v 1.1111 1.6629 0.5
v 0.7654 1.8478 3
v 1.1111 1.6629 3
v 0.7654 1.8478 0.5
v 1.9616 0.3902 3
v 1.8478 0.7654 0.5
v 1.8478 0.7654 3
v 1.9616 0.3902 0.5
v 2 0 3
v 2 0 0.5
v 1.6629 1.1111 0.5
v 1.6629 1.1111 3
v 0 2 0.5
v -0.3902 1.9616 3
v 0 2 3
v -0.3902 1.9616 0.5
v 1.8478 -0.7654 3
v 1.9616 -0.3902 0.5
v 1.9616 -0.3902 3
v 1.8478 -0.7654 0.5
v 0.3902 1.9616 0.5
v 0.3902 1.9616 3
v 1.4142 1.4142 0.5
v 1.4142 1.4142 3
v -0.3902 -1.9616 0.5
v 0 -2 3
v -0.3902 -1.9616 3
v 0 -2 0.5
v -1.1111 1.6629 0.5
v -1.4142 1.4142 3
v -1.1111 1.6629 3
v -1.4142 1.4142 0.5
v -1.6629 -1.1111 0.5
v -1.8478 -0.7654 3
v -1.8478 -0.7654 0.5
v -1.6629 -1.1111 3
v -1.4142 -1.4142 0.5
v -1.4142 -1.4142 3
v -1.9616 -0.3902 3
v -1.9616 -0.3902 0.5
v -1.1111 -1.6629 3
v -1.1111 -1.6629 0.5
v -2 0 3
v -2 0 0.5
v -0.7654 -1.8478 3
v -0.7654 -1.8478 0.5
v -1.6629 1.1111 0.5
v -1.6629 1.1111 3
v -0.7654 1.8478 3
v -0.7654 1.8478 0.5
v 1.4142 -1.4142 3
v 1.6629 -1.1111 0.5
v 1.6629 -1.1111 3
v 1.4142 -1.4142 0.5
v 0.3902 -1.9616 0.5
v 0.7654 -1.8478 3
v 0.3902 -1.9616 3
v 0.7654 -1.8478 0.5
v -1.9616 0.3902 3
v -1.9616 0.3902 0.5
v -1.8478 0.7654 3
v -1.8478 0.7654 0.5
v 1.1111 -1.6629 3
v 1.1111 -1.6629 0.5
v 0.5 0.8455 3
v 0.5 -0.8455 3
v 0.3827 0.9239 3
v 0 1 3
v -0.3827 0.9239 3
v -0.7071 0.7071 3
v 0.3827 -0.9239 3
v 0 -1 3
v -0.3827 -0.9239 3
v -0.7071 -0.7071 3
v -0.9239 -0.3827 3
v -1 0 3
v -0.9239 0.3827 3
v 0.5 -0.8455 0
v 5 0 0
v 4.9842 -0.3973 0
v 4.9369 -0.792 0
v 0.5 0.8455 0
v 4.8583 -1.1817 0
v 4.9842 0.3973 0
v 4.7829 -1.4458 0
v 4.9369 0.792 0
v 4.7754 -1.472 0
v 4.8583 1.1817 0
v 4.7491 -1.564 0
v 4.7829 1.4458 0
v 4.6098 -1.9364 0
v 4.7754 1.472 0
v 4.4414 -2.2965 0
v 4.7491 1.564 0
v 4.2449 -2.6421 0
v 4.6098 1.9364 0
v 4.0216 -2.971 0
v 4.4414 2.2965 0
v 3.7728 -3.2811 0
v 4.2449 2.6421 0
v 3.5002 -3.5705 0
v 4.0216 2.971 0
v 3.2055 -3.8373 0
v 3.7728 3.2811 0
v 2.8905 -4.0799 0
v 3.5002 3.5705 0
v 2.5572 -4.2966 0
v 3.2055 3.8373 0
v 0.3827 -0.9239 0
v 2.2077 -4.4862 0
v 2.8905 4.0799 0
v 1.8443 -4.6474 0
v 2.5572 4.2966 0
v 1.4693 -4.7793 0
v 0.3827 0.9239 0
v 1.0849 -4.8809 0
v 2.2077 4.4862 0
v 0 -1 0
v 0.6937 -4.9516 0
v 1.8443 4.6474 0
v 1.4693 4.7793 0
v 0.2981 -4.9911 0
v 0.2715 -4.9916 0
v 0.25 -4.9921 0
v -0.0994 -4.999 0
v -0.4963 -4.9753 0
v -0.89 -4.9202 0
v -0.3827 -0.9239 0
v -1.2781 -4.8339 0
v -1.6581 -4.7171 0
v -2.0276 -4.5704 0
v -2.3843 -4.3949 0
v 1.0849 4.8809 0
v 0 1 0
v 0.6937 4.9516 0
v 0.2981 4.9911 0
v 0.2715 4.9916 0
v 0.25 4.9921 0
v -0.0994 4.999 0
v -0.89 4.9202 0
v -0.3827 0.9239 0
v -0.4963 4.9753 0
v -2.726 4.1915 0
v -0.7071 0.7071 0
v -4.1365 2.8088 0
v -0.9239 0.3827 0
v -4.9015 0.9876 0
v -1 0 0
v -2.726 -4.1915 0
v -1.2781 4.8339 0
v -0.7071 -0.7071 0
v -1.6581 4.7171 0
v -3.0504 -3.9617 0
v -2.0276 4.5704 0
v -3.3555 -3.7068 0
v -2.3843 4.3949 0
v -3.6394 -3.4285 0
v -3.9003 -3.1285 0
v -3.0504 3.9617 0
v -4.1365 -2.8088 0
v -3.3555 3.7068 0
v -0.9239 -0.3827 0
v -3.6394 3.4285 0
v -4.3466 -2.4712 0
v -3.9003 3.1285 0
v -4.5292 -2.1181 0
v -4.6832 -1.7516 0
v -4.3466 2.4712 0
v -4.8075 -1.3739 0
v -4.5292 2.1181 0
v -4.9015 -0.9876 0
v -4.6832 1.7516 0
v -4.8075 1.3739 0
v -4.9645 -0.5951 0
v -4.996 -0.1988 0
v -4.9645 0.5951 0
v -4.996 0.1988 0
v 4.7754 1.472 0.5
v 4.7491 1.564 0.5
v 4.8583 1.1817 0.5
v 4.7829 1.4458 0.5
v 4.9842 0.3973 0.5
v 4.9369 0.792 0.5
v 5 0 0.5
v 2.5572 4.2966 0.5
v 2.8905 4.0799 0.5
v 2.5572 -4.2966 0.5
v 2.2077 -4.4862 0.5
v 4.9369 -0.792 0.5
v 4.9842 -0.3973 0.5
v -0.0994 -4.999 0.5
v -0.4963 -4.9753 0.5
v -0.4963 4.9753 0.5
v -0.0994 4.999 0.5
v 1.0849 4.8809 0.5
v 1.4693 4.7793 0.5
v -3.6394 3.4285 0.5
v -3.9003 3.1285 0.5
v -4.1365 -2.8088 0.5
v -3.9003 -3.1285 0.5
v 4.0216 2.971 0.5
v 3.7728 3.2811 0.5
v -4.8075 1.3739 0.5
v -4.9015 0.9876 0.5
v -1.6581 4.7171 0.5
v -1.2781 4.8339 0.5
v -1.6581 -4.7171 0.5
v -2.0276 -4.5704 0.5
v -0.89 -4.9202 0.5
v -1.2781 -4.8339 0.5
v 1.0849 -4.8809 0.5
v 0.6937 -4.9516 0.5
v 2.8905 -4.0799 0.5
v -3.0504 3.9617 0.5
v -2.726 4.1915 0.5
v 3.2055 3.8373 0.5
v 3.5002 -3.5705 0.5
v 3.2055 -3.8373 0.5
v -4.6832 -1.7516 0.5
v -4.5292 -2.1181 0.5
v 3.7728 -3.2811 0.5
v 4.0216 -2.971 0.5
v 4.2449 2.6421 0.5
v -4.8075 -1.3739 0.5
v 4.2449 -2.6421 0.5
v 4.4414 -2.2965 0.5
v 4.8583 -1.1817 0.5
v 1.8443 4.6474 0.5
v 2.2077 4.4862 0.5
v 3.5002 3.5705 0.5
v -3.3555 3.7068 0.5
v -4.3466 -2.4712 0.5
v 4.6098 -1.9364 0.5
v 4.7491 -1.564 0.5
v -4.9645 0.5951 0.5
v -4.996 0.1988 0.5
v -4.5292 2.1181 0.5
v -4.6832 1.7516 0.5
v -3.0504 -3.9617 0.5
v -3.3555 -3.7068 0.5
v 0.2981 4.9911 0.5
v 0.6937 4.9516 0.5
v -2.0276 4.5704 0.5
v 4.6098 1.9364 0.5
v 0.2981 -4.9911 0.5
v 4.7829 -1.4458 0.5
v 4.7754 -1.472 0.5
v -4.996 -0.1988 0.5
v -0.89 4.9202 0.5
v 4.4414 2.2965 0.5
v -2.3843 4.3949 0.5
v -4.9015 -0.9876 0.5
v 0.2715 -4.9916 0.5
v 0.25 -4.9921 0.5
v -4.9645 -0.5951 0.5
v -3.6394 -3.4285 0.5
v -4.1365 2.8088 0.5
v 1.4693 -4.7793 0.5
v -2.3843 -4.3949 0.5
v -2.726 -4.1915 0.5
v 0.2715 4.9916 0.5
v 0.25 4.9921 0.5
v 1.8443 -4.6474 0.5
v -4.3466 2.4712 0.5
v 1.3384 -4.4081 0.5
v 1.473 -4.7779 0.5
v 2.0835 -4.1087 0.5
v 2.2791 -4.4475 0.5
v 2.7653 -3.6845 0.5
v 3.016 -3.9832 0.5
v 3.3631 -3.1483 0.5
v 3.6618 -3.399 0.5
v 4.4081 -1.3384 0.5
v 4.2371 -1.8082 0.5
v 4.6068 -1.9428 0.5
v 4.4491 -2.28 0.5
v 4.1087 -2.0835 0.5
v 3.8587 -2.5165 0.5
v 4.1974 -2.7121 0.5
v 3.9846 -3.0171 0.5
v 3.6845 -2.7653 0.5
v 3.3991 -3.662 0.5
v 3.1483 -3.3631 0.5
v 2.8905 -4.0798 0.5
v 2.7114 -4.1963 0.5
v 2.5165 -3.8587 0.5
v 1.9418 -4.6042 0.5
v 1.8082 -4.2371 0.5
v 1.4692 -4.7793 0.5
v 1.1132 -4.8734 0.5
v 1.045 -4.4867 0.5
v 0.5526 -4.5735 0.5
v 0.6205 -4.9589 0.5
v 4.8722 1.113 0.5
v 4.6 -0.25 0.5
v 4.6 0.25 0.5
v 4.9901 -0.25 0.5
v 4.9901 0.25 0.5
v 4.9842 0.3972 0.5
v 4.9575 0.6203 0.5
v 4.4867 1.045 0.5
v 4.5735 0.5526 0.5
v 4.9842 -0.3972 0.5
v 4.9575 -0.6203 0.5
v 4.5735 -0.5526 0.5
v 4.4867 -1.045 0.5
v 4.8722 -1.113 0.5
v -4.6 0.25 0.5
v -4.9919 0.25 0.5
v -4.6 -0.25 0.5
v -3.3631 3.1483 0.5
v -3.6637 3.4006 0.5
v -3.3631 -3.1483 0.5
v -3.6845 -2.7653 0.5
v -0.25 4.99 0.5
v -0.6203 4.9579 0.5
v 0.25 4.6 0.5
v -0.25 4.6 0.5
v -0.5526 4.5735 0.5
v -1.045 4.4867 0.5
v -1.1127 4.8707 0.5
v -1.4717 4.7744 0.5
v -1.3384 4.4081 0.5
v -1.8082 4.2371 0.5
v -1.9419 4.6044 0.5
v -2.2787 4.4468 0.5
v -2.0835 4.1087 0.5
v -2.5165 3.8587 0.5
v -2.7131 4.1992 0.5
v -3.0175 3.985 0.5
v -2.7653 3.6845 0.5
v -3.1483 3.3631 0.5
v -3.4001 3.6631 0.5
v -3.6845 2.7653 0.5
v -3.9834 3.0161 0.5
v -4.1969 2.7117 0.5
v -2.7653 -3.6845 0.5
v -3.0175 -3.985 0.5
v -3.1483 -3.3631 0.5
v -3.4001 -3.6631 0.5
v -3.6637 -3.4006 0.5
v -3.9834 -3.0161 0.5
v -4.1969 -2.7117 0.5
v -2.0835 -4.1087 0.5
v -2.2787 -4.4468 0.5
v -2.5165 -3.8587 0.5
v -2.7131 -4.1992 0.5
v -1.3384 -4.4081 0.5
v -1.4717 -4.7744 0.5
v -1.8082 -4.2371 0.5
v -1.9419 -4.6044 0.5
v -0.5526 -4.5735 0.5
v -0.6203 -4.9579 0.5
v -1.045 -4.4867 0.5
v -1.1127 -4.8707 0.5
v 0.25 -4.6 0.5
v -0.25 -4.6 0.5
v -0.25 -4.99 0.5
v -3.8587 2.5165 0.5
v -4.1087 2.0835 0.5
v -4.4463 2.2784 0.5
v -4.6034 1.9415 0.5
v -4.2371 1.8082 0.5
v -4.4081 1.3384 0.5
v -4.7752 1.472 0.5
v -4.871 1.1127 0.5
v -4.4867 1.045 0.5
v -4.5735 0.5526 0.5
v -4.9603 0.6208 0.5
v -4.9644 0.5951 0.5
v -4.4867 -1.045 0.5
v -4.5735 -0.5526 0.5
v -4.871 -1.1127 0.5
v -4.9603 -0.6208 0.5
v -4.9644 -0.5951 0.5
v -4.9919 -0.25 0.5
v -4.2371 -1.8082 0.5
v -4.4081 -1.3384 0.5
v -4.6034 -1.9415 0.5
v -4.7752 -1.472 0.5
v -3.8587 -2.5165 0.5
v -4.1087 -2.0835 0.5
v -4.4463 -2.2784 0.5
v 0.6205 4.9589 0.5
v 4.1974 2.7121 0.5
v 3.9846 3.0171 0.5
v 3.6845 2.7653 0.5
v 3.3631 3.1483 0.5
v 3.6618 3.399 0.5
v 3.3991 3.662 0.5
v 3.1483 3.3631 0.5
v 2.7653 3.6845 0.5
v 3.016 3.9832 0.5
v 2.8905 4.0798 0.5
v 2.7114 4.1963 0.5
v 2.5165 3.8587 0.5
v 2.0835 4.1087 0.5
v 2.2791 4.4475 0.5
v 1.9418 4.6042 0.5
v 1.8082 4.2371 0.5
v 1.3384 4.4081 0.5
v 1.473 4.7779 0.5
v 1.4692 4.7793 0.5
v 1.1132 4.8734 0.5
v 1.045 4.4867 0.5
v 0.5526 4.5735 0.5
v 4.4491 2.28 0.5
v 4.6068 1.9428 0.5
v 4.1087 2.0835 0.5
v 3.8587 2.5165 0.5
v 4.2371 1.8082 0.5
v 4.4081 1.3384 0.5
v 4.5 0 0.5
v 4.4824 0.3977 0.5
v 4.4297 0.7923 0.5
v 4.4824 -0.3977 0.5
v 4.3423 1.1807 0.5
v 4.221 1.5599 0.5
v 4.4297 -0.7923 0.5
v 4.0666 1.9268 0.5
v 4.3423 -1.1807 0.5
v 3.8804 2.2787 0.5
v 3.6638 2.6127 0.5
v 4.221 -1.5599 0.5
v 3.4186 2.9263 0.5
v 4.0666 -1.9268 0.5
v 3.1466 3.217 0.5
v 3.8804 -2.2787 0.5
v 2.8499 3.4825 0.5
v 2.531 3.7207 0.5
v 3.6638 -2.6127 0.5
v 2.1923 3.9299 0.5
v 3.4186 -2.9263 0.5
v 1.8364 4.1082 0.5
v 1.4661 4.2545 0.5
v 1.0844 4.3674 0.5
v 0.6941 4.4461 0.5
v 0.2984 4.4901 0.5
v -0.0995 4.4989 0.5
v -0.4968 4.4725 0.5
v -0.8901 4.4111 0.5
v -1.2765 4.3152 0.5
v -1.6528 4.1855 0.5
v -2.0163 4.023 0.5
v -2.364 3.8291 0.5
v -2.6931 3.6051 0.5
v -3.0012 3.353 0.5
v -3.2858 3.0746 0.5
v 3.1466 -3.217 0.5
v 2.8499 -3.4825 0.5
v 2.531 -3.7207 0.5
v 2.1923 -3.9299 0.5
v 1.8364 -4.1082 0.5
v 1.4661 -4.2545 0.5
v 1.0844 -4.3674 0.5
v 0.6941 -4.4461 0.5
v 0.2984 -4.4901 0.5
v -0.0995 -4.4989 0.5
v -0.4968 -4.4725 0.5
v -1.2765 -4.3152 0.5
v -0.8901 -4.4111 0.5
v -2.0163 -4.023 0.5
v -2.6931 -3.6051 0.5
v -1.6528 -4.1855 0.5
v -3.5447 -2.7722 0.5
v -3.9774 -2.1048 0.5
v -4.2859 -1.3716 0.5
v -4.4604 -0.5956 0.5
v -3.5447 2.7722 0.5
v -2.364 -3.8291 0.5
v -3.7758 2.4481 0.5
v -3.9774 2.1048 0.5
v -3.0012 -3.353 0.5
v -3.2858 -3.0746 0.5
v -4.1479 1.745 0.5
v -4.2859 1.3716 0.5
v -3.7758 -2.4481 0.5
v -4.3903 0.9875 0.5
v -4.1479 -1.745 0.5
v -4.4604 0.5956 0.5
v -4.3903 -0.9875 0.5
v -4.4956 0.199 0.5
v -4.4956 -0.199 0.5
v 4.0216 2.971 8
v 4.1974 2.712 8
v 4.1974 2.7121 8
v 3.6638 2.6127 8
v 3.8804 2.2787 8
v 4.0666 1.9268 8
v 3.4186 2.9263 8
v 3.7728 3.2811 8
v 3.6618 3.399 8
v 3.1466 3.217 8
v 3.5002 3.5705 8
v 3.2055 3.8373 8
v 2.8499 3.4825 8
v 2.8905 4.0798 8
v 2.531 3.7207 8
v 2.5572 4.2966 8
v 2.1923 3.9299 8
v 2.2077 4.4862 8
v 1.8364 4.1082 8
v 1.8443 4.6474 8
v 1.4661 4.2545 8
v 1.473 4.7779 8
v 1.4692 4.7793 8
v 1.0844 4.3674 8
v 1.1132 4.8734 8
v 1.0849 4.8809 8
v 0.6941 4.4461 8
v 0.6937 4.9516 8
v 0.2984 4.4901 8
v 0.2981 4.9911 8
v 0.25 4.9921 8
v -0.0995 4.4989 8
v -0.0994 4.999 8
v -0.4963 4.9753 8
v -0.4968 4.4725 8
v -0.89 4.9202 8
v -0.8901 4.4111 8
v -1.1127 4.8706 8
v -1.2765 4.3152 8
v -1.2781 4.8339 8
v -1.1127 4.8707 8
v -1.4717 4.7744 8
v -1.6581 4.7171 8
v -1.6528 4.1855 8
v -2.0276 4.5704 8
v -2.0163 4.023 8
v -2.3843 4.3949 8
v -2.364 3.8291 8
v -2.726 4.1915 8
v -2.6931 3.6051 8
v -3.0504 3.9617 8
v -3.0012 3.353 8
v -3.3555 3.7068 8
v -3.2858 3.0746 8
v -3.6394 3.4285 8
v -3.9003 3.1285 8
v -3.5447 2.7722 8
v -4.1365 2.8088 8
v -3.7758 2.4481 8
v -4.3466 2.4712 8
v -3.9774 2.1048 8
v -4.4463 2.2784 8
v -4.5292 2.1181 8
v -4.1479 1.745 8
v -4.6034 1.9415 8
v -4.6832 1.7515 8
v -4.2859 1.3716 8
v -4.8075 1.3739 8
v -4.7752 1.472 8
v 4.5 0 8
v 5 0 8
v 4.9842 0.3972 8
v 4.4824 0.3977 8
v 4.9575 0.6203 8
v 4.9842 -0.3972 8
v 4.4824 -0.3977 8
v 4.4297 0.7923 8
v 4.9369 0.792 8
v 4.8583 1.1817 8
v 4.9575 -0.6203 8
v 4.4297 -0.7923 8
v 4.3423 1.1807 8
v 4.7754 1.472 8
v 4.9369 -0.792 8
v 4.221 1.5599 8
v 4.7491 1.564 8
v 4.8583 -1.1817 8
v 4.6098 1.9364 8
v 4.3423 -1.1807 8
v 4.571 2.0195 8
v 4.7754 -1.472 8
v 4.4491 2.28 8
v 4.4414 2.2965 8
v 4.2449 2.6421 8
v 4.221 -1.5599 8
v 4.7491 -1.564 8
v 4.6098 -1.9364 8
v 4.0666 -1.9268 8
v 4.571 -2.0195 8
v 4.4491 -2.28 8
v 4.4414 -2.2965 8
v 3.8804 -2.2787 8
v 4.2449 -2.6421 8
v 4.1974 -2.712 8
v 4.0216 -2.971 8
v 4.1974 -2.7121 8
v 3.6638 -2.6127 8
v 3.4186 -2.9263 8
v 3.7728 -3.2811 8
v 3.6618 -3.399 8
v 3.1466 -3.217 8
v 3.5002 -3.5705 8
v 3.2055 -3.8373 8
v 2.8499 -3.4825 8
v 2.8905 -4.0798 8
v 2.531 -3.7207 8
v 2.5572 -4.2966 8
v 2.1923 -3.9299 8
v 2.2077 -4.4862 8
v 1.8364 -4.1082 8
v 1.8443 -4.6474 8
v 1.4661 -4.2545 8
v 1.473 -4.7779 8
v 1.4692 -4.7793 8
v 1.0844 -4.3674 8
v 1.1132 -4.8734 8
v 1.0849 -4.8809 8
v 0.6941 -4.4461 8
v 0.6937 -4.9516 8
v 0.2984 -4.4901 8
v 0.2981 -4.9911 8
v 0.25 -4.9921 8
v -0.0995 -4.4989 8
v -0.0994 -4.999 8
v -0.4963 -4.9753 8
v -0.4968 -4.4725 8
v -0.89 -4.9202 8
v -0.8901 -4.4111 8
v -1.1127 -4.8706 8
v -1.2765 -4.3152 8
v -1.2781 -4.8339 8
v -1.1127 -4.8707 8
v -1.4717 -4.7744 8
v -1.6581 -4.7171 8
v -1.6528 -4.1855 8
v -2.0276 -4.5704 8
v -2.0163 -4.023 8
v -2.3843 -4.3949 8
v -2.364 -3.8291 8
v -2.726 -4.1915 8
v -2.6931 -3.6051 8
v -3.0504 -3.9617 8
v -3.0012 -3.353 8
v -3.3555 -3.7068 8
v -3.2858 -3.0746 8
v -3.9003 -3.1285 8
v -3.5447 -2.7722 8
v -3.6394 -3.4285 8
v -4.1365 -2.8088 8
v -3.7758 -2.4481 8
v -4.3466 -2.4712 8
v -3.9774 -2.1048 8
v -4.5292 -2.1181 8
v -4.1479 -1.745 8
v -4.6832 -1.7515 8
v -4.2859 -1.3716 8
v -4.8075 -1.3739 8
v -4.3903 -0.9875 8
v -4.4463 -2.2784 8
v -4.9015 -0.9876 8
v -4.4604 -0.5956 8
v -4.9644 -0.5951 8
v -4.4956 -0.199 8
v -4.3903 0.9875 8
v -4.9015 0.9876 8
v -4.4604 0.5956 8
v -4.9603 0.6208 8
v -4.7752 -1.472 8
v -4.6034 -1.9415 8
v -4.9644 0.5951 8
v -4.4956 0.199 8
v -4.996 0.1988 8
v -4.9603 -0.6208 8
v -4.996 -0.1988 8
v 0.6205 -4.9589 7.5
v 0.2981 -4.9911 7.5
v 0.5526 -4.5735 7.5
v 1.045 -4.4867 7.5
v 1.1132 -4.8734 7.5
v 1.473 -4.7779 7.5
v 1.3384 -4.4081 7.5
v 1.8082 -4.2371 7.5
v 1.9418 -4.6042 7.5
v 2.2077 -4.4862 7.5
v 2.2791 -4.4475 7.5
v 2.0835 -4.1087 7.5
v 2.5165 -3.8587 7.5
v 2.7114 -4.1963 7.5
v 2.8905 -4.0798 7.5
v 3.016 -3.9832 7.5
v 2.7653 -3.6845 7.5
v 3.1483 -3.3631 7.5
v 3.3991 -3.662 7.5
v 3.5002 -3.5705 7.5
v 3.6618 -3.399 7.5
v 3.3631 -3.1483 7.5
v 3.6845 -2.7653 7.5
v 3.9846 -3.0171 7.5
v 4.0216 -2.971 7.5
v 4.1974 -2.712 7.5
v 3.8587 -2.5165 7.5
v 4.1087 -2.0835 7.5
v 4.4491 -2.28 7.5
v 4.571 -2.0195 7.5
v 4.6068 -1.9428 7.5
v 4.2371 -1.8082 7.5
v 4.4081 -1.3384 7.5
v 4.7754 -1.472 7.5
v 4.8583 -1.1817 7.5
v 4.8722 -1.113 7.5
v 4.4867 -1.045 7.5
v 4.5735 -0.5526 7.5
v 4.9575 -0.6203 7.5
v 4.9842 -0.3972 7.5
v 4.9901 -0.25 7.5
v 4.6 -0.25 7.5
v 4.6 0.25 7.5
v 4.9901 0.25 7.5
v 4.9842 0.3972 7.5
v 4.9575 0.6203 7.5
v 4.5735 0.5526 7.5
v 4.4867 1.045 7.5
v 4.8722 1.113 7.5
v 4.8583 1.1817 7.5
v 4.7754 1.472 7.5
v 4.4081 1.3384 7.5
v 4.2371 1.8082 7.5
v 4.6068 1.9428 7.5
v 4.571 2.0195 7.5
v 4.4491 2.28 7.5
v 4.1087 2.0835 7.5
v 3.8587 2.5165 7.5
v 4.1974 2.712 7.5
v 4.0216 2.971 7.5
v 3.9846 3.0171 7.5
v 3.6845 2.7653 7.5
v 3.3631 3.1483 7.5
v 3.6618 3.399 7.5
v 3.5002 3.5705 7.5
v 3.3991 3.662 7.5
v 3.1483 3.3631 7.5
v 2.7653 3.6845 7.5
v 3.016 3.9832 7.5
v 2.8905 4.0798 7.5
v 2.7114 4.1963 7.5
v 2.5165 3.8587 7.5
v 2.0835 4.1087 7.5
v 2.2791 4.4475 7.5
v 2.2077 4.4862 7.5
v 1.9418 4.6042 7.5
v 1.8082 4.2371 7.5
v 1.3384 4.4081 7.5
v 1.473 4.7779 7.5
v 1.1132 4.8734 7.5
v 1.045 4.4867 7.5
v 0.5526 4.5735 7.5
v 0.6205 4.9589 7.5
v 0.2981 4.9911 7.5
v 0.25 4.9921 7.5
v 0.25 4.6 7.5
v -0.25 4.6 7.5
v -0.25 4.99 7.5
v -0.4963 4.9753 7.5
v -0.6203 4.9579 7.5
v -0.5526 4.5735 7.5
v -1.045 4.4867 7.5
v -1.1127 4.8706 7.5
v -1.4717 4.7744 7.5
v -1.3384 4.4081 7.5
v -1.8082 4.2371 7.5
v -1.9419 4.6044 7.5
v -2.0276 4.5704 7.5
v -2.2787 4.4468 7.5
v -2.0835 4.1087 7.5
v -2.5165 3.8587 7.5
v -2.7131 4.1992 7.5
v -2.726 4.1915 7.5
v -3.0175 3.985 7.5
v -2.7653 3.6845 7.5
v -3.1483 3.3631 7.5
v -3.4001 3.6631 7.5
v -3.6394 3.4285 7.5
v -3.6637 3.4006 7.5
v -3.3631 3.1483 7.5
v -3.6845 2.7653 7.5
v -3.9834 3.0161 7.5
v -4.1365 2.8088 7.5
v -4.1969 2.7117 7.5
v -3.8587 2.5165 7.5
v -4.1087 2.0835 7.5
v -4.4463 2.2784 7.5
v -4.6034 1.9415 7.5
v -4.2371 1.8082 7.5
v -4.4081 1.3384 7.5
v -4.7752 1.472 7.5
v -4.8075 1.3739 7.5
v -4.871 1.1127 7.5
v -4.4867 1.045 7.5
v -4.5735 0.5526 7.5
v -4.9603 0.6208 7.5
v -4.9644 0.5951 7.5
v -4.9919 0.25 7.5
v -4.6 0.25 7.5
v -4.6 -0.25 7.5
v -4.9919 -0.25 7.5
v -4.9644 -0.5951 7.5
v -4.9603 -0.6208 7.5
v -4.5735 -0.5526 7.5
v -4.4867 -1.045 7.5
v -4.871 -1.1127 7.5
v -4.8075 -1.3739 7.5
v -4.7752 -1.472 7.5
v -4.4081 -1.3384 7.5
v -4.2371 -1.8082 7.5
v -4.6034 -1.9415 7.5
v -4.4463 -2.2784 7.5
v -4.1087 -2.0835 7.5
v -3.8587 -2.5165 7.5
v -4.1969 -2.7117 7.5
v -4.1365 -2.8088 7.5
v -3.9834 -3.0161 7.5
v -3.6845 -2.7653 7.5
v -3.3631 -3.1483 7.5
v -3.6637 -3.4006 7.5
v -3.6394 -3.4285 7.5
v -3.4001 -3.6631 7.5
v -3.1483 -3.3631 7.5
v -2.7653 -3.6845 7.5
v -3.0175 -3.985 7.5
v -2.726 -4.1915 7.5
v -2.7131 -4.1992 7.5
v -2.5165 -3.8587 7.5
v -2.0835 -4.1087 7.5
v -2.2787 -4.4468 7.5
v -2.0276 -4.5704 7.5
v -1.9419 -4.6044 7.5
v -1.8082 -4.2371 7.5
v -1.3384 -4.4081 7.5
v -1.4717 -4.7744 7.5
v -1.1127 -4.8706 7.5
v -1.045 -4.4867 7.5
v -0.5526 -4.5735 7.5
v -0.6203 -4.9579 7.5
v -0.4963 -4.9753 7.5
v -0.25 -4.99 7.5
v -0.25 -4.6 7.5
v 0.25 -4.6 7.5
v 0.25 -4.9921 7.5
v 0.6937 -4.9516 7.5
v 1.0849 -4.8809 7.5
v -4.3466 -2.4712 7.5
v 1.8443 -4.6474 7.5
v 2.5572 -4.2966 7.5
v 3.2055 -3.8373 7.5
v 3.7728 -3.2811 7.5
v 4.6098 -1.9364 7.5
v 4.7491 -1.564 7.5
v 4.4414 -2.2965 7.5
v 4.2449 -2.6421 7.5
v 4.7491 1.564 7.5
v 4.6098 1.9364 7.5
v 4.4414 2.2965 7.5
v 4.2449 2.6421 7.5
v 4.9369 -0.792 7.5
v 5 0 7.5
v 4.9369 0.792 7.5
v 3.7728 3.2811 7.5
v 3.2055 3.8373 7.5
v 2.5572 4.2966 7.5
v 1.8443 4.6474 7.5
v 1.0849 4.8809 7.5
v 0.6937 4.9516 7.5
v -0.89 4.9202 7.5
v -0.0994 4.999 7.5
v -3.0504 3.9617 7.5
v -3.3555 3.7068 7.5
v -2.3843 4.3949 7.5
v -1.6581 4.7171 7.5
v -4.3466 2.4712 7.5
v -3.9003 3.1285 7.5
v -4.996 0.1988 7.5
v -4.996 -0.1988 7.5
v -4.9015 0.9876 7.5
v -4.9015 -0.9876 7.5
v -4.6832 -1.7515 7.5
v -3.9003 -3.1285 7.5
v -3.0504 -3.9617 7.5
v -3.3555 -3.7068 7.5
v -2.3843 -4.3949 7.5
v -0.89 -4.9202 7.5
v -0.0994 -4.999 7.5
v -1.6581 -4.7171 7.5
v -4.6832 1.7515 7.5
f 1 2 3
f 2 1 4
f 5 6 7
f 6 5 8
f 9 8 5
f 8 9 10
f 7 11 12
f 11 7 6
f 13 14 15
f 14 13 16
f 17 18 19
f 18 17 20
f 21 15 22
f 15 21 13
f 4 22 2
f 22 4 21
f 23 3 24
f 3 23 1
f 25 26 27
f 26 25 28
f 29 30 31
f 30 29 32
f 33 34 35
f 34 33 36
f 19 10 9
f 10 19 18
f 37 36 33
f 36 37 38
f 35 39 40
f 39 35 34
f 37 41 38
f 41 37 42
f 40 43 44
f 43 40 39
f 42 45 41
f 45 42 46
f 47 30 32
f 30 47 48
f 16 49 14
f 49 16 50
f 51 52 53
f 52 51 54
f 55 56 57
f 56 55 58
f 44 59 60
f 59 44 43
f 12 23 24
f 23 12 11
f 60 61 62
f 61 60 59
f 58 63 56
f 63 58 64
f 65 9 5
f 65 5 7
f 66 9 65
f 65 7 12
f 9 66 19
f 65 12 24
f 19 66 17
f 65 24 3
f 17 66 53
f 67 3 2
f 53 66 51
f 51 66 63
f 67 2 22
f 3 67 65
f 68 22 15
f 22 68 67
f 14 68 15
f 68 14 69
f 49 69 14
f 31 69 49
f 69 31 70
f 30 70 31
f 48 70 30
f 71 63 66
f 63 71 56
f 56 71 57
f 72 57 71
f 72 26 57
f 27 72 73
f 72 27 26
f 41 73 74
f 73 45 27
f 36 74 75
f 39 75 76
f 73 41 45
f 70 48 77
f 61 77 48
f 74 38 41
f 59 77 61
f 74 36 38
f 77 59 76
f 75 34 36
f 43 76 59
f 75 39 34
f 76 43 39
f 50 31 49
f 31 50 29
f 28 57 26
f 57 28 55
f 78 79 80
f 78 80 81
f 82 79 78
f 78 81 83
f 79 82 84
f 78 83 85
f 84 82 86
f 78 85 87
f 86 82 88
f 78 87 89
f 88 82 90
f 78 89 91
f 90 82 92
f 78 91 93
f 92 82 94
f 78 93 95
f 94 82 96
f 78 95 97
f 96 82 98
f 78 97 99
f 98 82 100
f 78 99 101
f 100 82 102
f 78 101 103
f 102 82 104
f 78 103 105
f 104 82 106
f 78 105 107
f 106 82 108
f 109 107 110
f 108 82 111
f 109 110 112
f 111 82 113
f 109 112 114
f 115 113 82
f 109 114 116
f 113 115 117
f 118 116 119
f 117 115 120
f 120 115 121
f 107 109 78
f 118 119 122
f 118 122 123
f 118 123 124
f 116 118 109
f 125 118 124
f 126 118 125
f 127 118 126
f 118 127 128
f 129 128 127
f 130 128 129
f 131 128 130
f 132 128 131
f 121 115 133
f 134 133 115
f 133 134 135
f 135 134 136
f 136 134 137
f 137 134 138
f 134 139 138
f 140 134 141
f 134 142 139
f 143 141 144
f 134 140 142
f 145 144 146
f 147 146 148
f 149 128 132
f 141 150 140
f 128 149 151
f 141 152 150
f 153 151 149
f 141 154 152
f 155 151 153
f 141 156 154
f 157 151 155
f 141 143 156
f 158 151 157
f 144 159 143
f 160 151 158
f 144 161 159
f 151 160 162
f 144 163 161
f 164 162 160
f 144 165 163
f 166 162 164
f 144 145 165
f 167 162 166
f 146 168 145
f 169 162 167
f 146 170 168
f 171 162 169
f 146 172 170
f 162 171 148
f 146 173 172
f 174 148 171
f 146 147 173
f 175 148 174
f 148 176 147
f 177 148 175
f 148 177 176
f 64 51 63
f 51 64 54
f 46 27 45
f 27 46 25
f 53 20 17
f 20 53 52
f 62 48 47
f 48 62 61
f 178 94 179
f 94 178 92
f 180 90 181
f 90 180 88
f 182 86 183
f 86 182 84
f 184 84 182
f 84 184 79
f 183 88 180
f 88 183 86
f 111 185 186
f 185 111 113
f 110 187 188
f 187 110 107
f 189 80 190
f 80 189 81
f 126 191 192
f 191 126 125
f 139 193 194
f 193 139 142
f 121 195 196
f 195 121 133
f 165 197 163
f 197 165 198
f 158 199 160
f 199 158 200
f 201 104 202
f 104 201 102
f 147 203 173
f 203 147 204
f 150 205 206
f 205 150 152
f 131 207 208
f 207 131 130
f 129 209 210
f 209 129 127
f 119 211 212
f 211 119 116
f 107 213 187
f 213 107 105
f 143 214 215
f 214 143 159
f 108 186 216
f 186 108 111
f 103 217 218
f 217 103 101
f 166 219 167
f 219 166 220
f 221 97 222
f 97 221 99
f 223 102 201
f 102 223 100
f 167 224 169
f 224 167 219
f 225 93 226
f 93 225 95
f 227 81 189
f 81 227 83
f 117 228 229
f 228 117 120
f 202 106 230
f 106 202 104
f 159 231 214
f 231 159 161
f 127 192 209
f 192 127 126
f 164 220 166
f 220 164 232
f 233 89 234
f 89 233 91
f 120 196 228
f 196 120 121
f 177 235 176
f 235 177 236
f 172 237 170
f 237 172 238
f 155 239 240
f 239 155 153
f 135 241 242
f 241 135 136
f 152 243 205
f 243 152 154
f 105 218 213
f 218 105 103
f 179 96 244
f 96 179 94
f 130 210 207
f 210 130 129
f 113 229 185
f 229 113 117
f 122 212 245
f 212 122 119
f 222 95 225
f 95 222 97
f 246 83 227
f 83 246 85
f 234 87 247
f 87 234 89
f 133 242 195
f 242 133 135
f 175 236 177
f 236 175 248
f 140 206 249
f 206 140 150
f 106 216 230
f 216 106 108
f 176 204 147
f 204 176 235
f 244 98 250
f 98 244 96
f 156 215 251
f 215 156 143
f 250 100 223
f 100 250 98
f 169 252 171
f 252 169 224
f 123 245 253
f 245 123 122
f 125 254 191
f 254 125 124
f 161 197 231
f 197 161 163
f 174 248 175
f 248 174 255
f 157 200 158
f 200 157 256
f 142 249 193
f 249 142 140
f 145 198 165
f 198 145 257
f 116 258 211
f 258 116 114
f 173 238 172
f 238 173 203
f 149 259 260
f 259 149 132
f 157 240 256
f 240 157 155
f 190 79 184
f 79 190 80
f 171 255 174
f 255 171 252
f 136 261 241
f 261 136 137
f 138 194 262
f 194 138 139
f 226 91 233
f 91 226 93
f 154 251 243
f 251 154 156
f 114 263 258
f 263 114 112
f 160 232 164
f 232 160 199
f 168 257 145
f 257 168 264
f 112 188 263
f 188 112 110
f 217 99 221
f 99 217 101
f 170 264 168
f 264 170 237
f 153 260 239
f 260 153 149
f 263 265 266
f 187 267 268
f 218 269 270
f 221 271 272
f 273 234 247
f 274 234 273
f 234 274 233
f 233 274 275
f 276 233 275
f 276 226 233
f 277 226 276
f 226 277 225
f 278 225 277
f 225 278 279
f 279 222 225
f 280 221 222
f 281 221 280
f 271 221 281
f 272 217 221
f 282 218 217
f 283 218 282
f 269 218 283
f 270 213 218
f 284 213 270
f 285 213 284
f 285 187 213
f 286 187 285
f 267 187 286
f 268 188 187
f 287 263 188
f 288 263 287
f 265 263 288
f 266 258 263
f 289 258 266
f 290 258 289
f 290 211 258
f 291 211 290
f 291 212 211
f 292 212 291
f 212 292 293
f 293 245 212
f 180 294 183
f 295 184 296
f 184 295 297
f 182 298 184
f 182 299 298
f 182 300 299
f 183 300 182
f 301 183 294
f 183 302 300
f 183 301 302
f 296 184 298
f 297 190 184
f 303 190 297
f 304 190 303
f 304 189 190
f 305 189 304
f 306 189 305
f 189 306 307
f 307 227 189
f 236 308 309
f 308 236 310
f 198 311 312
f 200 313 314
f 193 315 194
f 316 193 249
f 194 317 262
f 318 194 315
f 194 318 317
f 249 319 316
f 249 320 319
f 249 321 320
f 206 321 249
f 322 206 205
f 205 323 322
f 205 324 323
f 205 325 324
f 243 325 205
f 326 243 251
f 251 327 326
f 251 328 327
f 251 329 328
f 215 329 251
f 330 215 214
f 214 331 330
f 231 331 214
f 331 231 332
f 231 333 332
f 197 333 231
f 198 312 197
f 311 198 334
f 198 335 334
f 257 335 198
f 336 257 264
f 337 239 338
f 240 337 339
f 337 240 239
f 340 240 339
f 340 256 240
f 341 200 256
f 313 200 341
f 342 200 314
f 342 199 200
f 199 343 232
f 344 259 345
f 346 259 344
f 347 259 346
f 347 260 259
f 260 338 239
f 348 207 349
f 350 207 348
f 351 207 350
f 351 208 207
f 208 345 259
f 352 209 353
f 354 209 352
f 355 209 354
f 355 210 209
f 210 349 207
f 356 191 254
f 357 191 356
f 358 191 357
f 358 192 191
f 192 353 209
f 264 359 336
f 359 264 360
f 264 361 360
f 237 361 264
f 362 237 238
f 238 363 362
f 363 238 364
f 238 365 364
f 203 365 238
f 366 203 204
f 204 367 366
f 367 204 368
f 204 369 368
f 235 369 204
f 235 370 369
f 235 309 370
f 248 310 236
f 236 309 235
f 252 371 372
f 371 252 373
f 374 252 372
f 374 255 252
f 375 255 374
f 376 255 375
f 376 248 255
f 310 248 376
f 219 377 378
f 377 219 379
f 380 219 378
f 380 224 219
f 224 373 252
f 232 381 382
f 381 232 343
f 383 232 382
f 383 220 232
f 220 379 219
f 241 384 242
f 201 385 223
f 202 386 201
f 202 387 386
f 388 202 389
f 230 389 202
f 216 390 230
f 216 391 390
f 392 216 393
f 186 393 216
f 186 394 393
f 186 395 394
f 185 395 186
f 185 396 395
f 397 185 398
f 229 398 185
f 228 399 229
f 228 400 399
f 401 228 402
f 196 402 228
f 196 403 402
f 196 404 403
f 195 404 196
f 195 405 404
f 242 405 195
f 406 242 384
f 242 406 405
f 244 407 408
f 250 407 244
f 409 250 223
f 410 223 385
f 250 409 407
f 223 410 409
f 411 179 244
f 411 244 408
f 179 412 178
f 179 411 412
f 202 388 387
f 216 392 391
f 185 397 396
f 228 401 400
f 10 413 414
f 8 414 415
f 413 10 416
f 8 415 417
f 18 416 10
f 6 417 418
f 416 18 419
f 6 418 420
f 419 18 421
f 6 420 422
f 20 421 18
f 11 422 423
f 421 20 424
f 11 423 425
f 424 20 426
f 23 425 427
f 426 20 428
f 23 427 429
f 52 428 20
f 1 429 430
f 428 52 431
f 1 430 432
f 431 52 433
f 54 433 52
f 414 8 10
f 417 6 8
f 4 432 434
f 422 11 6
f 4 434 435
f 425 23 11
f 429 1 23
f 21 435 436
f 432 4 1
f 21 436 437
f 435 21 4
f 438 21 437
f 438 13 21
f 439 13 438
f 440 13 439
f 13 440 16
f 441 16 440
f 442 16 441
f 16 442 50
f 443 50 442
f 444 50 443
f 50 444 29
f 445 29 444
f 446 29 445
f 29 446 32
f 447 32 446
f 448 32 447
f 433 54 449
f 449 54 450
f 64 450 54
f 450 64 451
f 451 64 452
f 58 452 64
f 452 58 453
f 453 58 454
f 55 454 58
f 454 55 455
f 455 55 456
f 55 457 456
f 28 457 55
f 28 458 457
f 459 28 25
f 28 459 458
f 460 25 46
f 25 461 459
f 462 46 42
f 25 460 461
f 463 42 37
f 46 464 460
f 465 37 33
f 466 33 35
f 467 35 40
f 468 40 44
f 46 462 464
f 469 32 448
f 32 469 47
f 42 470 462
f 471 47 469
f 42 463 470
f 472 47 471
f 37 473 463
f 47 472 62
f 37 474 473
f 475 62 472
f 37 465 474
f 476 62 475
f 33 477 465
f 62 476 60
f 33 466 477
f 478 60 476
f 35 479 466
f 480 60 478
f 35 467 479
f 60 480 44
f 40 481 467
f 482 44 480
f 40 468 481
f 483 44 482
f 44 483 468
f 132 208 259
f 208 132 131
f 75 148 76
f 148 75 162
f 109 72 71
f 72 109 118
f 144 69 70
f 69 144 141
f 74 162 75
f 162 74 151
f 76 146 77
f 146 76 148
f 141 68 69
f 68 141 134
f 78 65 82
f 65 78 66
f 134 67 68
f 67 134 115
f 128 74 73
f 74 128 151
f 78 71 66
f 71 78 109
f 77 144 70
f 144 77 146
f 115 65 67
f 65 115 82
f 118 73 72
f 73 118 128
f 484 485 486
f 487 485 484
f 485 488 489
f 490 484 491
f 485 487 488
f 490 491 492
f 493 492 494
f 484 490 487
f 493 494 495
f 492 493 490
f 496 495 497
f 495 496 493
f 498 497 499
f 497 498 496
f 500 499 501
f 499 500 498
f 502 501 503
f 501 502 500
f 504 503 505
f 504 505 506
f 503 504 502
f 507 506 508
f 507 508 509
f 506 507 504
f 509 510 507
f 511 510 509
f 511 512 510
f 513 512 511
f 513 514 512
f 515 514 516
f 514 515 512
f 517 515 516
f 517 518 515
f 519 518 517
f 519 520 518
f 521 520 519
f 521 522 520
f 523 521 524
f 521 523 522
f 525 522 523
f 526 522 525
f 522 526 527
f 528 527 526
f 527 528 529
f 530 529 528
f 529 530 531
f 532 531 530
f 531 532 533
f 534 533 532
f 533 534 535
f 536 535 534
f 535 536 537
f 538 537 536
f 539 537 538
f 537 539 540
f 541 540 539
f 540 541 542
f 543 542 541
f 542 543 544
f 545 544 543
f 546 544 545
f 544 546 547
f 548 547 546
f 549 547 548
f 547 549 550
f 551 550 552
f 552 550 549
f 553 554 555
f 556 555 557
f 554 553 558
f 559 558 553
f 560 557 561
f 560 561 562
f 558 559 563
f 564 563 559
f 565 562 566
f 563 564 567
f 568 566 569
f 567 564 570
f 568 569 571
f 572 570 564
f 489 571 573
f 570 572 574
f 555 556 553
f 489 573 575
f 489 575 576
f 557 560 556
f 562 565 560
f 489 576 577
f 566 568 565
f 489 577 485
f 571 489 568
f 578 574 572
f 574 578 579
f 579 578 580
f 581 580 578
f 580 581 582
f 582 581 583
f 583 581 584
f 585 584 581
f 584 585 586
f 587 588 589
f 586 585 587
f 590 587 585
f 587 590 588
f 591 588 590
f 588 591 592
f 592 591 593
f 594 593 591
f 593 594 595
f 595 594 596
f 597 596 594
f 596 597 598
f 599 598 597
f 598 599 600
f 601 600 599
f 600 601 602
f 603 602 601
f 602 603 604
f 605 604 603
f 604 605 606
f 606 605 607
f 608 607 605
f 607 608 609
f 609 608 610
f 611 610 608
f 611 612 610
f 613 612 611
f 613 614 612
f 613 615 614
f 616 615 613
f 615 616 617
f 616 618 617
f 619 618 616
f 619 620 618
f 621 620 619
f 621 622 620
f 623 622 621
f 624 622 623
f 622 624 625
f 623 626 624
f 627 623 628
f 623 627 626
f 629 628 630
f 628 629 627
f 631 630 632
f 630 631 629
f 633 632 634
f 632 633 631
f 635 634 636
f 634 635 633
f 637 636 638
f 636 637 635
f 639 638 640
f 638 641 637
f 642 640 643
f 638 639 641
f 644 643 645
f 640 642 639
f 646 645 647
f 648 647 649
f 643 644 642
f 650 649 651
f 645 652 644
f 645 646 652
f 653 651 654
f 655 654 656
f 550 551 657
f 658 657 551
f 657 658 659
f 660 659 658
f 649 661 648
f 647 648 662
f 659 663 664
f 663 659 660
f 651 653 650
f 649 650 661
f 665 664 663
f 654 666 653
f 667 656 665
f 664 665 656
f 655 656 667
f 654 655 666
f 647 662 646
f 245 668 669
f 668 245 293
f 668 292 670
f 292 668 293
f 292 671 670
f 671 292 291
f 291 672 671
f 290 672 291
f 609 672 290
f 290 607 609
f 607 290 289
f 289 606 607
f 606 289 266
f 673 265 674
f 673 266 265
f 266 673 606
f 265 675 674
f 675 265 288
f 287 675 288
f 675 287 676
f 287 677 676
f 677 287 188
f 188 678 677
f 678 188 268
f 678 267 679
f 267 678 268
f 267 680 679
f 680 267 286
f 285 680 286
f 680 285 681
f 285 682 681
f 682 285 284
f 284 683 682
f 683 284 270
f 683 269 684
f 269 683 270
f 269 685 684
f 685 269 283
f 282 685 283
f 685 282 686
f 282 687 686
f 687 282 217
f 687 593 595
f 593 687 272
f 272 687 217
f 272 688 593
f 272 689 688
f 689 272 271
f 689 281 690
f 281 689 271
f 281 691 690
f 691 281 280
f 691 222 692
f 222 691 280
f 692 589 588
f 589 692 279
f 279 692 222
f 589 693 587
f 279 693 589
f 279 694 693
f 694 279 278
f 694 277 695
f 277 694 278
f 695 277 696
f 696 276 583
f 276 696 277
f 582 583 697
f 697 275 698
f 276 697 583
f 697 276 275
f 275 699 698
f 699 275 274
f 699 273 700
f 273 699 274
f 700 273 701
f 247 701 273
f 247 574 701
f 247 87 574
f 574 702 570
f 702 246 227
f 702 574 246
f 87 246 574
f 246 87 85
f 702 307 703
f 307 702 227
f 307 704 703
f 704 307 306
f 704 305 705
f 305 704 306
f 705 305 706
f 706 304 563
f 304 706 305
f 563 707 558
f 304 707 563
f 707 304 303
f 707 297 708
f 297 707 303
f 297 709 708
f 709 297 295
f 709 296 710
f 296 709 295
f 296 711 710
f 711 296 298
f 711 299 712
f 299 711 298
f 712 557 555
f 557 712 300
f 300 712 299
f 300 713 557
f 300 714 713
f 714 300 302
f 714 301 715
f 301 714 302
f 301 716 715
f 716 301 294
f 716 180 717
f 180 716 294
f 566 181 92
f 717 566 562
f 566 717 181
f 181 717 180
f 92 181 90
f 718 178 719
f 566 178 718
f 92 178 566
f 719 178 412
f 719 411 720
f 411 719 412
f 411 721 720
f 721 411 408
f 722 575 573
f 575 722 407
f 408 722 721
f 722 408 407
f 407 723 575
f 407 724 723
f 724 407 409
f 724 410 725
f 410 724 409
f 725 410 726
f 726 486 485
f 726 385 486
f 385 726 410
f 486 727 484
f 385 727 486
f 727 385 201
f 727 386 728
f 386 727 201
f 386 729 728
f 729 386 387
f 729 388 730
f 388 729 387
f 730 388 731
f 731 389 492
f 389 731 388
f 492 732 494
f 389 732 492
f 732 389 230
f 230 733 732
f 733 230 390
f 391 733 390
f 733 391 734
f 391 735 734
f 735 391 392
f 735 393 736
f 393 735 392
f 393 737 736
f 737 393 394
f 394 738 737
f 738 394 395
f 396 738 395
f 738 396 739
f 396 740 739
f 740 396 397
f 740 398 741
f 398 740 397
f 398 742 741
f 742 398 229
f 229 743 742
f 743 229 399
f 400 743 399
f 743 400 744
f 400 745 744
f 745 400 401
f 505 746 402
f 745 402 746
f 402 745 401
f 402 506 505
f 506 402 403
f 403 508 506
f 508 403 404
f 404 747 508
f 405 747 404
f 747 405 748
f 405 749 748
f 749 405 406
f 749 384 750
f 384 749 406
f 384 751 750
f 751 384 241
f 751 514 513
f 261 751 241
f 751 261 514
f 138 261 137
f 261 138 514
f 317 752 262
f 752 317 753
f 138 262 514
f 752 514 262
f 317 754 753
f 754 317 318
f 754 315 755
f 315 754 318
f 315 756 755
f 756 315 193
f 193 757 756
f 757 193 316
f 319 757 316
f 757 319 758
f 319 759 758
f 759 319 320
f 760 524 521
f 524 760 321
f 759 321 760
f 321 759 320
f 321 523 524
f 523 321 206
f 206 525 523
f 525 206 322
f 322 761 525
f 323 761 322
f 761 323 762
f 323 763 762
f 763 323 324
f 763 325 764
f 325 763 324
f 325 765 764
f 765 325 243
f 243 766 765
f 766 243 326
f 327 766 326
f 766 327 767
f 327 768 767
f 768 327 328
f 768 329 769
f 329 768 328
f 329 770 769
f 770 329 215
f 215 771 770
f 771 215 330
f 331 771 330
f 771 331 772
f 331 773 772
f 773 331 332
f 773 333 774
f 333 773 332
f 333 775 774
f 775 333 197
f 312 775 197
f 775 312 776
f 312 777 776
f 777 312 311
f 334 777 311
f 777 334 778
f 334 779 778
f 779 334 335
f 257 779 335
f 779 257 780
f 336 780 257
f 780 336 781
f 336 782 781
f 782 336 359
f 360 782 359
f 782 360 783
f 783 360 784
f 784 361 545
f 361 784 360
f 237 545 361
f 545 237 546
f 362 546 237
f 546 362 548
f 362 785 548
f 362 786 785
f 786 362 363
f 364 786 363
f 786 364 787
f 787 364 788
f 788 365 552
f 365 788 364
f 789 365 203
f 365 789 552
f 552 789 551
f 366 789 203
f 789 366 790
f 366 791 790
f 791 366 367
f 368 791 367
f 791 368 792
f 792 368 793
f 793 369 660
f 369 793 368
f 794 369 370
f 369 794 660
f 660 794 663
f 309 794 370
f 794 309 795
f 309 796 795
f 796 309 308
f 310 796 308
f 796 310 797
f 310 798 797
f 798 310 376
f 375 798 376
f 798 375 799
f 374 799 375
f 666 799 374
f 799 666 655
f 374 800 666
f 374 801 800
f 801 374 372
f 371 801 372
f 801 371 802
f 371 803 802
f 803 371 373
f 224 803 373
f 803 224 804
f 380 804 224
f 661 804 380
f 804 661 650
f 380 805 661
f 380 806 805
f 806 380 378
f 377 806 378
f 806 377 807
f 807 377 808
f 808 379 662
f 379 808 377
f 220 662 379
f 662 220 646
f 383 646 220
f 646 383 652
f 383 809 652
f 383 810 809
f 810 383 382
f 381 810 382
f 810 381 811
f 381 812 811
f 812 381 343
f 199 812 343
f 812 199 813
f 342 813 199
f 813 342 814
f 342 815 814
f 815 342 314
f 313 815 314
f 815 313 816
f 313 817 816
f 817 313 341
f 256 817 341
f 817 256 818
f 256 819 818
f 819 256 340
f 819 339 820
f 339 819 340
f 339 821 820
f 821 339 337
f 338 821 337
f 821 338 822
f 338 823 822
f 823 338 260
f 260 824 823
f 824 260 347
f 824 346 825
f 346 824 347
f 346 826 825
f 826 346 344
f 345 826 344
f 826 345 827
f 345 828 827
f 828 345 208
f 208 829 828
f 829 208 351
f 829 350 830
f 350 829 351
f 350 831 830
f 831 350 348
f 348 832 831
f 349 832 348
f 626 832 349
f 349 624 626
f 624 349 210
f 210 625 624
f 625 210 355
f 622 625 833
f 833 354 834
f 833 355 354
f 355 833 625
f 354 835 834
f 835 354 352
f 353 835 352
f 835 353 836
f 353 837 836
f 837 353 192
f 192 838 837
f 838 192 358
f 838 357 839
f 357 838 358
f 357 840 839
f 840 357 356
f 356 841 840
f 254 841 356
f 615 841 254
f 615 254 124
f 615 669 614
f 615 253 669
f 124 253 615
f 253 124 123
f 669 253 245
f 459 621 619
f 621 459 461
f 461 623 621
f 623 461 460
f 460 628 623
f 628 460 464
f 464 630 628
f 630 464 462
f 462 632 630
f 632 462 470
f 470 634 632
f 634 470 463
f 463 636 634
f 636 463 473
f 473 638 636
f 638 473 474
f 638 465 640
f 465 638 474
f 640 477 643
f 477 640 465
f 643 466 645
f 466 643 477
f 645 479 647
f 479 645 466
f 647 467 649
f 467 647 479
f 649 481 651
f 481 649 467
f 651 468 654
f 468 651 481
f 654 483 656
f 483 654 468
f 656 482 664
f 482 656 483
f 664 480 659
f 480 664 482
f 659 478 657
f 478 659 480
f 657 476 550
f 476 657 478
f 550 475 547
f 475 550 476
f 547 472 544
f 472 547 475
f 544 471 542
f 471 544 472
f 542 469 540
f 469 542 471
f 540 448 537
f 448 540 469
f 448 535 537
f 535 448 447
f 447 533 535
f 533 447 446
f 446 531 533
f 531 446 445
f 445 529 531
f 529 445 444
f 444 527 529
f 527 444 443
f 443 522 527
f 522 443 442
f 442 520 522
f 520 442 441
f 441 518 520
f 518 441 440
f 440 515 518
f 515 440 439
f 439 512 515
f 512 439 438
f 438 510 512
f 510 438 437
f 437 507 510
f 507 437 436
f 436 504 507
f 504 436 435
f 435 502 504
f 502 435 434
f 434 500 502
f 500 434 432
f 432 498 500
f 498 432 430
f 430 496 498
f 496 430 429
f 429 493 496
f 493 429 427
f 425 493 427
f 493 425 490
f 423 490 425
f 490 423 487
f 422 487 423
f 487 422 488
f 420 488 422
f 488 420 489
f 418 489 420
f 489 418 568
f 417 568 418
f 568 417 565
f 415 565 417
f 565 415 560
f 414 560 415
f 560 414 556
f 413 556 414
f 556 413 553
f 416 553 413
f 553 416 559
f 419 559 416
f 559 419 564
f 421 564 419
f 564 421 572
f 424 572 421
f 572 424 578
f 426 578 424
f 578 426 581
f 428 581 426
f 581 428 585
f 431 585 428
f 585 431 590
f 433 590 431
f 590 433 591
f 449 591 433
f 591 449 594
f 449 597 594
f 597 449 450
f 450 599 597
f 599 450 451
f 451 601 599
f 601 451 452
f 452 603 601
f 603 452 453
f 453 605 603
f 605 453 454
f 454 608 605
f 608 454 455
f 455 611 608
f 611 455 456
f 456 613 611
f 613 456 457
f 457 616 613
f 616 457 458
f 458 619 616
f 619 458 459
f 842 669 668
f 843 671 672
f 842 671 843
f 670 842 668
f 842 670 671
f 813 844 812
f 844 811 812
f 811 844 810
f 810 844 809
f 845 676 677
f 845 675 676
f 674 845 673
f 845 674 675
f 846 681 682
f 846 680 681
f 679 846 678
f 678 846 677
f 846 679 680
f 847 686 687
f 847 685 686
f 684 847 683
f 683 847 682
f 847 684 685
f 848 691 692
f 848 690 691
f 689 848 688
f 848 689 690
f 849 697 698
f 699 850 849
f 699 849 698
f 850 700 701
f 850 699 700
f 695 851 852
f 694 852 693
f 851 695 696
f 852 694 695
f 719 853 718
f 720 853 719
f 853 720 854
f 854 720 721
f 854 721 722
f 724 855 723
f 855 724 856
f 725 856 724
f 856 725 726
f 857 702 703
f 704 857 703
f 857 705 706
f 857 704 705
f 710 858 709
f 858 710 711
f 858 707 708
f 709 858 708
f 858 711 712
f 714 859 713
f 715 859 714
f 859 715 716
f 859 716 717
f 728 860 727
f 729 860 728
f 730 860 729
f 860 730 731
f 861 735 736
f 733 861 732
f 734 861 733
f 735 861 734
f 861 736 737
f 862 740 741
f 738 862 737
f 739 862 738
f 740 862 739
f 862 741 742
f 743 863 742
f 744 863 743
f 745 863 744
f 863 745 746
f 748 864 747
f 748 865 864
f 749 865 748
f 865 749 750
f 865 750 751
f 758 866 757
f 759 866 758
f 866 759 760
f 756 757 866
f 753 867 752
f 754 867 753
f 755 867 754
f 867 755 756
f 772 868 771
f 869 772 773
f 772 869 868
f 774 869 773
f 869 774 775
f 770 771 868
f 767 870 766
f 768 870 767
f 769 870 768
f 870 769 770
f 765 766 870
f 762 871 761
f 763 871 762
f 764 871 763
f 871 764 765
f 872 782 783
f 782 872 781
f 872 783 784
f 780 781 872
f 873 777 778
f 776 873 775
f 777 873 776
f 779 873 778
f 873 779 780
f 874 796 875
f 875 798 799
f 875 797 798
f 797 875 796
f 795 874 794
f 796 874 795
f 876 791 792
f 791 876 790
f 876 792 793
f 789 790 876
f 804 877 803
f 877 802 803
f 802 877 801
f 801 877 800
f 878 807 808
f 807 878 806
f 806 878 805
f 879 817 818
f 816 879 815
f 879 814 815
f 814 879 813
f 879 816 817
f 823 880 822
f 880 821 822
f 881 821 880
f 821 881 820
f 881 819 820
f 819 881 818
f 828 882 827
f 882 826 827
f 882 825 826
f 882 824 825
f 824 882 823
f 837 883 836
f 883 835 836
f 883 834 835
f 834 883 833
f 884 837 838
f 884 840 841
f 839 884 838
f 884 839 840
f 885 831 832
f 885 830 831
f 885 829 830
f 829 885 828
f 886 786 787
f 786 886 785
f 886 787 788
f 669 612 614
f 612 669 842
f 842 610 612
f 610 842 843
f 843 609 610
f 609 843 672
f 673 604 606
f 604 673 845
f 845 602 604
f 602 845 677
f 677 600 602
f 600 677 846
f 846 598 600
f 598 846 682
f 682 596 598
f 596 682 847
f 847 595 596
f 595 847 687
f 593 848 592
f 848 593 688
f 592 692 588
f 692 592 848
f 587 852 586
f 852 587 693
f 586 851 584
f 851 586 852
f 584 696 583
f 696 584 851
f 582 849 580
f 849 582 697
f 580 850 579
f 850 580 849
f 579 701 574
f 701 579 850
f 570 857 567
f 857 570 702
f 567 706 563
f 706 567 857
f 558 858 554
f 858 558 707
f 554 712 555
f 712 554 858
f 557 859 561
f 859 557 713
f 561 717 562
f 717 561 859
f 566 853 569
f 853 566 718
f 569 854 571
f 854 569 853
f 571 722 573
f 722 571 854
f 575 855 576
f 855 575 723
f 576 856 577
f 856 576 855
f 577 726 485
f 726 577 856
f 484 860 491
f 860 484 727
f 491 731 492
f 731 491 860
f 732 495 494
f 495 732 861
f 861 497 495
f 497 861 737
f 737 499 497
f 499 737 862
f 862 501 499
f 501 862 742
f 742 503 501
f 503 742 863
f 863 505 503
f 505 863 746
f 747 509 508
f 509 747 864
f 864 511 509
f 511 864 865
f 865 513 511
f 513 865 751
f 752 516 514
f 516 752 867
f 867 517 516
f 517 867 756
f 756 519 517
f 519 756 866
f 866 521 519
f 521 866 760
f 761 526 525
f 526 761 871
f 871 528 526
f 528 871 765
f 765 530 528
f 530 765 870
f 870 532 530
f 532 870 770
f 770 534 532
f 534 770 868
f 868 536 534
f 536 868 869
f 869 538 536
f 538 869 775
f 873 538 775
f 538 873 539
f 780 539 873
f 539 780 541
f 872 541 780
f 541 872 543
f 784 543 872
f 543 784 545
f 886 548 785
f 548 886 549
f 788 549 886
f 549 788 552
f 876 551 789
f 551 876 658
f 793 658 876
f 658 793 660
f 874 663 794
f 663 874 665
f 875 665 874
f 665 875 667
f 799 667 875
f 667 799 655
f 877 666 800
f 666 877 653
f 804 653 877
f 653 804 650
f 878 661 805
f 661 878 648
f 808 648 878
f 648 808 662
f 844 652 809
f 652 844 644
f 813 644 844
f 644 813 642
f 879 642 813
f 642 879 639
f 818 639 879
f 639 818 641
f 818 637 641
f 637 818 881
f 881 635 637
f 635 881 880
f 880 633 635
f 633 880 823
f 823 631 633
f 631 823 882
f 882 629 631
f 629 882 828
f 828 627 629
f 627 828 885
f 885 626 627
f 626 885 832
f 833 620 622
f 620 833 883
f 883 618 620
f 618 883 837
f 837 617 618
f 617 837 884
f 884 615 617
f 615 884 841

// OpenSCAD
// $fa is related to arcs
// $fs = smallest segment
$fs = 0.4; // millimetres
$fa = 1.0;

shaft_length = 3;
shaft_diameter = 2.0;
flat_diameter = 1.5;

shaft_radius = shaft_diameter / 2.0;

wheel_outer_diameter = 10;
wheel_inner_diameter = wheel_outer_diameter - 1.0;
wheel_width = 8.0;
rim_width = 0.5;

module main()
{
    // shaft and base
    difference()
    {
        union() {
            // Shaft holder
            cylinder(r=shaft_radius + 1.0, h=shaft_length);
            // Base plate
            cylinder(r=(wheel_outer_diameter/2), h=rim_width);
        }
        // Shaft cutout with flat.
        translate([0,0,-0.5])
        linear_extrude(height=20)
            difference() {
                circle(r=shaft_radius);
                // flat
                translate([shaft_radius - (shaft_diameter - flat_diameter), -5])
                    square([10, 10]);
            }
    }
    // wheel outer
    linear_extrude(height=wheel_width)
    {
        difference() {
            circle(r=wheel_outer_diameter / 2);
            circle(r=wheel_inner_diameter / 2);
            // Small cutouts
            for (r=[0:10:360]) {
                rotate([0,0,r]) {
                    translate([(wheel_outer_diameter/2),0])
                        square([0.8,0.5], center=true);
                }
            } // endfor
        }
    }
    // Wheel top rim
    translate([0,0, wheel_width - rim_width])
    linear_extrude(height=rim_width)
    {
        difference() {
            circle(r=wheel_outer_diameter / 2);
            circle(r=wheel_inner_diameter / 2);
        }
    }
    
}

main();
